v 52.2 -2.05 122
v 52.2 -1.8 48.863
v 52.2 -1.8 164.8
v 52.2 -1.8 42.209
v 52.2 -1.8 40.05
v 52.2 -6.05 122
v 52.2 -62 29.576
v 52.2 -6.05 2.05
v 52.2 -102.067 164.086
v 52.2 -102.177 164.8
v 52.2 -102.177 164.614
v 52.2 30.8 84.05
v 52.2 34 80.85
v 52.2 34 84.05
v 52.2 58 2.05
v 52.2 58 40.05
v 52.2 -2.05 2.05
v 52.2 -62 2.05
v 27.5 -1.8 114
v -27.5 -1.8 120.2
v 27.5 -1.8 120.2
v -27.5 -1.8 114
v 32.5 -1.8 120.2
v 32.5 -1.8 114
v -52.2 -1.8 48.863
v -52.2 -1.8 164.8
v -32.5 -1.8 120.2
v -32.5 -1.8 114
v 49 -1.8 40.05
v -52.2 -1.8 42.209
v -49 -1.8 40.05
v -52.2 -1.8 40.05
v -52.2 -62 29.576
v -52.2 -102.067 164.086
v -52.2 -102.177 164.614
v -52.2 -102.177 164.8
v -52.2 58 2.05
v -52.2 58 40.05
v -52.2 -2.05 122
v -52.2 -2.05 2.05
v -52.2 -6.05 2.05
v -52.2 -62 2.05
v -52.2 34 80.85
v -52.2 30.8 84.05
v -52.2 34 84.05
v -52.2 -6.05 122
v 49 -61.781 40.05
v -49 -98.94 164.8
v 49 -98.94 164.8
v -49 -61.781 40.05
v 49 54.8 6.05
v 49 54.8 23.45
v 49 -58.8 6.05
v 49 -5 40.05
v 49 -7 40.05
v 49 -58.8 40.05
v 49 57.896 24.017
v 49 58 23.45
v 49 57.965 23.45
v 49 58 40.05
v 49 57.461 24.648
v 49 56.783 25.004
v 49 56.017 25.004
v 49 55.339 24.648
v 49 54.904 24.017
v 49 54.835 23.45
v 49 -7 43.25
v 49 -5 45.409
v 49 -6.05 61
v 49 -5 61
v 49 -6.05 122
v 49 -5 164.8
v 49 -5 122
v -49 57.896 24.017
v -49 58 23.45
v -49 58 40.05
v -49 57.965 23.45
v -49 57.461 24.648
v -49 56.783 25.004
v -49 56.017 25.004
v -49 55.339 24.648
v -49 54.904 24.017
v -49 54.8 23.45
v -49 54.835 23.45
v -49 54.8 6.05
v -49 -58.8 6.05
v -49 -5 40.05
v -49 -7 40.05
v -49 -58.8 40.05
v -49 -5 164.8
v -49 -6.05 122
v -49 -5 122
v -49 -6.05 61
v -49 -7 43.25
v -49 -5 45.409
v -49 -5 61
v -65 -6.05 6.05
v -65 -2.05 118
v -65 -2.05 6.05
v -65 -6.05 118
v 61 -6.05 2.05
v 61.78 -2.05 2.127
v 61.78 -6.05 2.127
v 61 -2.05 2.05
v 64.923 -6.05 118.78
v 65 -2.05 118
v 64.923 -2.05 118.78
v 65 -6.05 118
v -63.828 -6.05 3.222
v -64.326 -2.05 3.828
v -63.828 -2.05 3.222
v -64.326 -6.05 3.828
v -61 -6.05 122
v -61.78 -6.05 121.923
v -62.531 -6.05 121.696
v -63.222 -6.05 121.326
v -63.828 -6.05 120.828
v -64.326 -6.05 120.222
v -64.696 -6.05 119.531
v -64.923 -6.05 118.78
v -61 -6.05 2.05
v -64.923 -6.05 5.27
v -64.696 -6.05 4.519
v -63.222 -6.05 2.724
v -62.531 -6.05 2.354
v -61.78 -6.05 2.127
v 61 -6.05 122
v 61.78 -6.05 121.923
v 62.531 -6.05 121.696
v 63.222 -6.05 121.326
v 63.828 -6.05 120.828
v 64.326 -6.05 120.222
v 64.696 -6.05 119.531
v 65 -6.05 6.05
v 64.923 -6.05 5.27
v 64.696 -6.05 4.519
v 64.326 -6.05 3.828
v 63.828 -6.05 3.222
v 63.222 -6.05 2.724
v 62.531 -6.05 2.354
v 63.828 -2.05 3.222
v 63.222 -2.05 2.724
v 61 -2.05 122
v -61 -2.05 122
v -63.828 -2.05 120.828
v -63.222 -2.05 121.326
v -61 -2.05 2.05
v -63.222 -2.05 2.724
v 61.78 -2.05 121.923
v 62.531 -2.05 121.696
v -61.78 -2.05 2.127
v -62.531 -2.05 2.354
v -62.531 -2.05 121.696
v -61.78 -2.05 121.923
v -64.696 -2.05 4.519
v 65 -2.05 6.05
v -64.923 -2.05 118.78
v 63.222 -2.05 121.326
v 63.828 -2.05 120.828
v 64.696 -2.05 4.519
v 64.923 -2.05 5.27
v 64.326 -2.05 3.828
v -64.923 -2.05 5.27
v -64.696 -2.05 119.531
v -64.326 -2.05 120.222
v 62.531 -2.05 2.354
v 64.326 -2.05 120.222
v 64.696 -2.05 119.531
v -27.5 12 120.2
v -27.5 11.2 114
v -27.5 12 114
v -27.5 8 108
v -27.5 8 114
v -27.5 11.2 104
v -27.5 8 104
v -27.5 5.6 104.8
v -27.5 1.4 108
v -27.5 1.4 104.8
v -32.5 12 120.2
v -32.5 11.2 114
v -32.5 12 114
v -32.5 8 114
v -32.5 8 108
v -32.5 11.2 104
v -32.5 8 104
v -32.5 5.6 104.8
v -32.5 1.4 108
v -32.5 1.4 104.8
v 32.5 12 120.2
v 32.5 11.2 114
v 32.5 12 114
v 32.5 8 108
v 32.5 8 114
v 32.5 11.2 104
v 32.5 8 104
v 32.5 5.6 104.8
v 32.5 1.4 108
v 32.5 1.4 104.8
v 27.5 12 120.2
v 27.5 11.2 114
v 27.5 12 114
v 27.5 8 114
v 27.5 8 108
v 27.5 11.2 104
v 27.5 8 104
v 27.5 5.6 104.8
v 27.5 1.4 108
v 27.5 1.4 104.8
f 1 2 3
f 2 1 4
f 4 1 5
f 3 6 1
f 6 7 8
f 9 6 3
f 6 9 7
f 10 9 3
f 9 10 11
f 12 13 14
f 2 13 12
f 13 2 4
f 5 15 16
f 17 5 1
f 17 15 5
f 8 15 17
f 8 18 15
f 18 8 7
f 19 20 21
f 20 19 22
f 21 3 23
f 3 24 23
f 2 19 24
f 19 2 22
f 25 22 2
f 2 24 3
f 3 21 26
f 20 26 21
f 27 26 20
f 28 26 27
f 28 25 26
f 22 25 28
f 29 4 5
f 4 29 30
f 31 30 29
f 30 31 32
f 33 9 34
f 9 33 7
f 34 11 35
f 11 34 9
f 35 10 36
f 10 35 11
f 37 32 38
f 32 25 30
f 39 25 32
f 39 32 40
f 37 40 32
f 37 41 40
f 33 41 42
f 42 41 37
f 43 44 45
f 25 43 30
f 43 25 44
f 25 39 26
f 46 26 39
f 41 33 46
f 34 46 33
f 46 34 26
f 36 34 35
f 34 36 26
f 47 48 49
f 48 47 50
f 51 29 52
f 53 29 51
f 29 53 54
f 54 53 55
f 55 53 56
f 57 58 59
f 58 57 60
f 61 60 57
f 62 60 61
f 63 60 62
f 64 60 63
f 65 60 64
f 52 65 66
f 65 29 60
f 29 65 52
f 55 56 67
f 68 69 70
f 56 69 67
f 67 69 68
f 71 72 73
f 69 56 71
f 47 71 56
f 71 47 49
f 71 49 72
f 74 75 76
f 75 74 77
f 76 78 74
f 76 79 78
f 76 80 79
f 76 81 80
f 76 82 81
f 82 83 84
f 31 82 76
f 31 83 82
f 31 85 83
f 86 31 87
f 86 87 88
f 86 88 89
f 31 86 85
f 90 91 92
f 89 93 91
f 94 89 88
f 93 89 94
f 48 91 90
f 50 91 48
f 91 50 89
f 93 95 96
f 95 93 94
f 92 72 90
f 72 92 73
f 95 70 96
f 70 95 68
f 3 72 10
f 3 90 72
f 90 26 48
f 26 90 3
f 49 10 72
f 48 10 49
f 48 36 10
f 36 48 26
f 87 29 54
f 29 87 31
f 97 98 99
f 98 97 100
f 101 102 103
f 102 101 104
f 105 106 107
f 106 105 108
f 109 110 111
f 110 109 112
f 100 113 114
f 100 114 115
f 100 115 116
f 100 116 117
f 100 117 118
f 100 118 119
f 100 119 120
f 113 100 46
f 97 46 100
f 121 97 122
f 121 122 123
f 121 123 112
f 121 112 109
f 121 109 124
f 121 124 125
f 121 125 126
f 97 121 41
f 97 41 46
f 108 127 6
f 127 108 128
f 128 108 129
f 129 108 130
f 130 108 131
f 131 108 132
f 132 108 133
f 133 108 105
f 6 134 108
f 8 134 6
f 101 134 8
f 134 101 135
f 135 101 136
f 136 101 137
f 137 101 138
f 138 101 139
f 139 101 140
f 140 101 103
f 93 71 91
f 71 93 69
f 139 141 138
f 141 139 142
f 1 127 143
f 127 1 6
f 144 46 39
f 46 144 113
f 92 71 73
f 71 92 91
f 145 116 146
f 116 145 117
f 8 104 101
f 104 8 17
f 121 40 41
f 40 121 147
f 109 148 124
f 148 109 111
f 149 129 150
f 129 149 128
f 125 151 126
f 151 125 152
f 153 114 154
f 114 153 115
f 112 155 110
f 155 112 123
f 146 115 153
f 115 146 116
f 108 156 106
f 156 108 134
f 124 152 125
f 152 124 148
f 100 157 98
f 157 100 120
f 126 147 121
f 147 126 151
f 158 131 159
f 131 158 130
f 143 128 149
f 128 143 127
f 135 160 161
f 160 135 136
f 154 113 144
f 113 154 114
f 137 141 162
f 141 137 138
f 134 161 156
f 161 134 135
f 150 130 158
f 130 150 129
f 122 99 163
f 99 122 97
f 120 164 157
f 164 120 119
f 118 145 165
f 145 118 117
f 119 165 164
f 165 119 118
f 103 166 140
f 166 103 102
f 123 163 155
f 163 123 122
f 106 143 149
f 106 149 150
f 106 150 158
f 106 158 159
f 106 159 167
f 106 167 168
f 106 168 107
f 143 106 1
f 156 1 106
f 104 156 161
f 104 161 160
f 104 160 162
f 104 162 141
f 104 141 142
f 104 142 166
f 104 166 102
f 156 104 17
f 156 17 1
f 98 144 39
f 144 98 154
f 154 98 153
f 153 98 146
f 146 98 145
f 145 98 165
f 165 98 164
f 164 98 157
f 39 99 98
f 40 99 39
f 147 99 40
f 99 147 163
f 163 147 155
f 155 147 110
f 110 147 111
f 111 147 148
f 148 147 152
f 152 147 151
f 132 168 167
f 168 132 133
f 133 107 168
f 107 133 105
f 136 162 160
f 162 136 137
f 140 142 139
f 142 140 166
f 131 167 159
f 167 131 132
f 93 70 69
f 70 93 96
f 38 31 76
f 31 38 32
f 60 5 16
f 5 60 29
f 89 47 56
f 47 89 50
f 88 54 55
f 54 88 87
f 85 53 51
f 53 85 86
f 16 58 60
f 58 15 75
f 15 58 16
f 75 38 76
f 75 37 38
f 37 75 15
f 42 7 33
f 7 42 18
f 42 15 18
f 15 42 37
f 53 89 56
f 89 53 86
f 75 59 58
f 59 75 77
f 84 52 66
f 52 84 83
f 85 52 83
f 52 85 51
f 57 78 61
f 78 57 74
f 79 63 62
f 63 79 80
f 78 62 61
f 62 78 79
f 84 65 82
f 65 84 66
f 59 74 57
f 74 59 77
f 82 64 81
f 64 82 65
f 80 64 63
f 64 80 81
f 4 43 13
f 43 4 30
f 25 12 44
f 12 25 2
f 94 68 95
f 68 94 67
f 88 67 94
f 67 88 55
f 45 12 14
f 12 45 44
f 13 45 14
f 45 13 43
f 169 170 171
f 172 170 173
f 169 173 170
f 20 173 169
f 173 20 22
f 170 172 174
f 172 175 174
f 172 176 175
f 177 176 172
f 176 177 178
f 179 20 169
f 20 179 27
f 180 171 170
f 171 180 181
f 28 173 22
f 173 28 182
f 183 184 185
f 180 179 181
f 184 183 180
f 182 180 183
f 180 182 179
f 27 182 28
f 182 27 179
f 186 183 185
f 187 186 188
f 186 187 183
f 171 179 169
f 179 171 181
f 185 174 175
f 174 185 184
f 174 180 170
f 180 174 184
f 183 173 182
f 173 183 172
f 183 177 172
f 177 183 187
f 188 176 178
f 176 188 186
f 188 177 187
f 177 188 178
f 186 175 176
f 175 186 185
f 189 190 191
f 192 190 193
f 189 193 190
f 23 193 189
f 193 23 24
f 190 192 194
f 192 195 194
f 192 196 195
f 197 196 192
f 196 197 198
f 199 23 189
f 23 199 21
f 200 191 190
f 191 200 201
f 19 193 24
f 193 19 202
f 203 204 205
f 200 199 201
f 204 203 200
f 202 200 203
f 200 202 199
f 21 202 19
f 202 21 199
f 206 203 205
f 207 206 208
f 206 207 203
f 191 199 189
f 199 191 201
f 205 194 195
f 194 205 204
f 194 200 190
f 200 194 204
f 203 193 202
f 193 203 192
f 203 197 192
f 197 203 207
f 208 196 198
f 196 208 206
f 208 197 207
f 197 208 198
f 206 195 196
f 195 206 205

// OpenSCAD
part = "candidate_a";

$fa = 5;
$fs = 0.8;

door_width = 110;
door_height = 110;
bar_spacing = 12;
bar_diameter = 3.5;
wall = 3.2;
door_tolerance = 3;
tray_base = bar_diameter/2 + 0.3;

inner_width = door_width - 12;
plate_width = door_width + 20;
plate_bottom = tray_base;
plate_top = door_height + 12;
plate_thickness = max(wall, 4);
tray_back = -62;
tray_front = 58;
tray_floor = 4;
tray_wall_height = 34;
tray_lip_height = 19;
hood_front = 34;
hook_center = bar_spacing * 2.5;
hook_width = min(5, bar_spacing - bar_diameter - 1.5);
hook_depth = bar_diameter + 2.5;
hook_throat = bar_diameter - 0.3;
outlet_top = tray_base + tray_floor + tray_wall_height;

cavity = [[-57,24],[-5,24],[-5,165],[-99,165]];

function side_x(s) = s > 0 ? inner_width/2 : -inner_width/2-wall;

module yz_extrude(width) {
    translate([-width/2,0,0]) rotate([90,0,90]) linear_extrude(width) children();
}

module rounded_xz(width,height,r) {
    offset(r=r) square([width-2*r,height-2*r],center=true);
}

module reservoir_shell() {
    difference() {
        yz_extrude(inner_width + 2*wall) offset(r=wall) polygon(cavity);
        yz_extrude(inner_width) polygon(cavity);
        translate([-inner_width/2-2*wall,-110,164.8]) cube([inner_width+4*wall,120,20]);
        translate([-inner_width/2-0.1,-61,18]) cube([inner_width+0.2,61,outlet_top-18]);
    }
}

module faceplate() {
    difference() {
        translate([0,-bar_diameter/2-0.3-plate_thickness/2,(plate_bottom+plate_top)/2])
            rotate([90,0,0]) linear_extrude(plate_thickness,center=true)
                rounded_xz(plate_width,plate_top-plate_bottom,4);
        translate([0,-bar_diameter/2-0.3-plate_thickness/2,30]) cube([inner_width,plate_thickness+2,62],center=true);
    }
}

module trough() {
    translate([-inner_width/2-wall,tray_back,0]) cube([inner_width+2*wall,tray_front-tray_back,tray_floor]);
    for (s=[-1,1]) translate([side_x(s),tray_back,tray_floor])
        cube([wall,tray_front-tray_back,tray_wall_height]);
    translate([-inner_width/2-wall,tray_back,tray_floor])
        cube([inner_width+2*wall,wall,tray_wall_height]);
    translate([-inner_width/2-wall,tray_front-wall,tray_floor])
        cube([inner_width+2*wall,wall,tray_lip_height-wall/2]);
    translate([-inner_width/2-wall,tray_front-wall/2,tray_floor+tray_lip_height-wall/2])
        rotate([0,90,0]) cylinder(d=wall,h=inner_width+2*wall);
    for (s=[-1,1]) translate([s*(inner_width/2+wall/2),tray_front-13,tray_floor+tray_lip_height])
        rotate([90,0,0]) cylinder(d=wall,h=tray_front-tray_back-13);
}

module hood() {
    hood_low = tray_floor + tray_wall_height;
    hood_high = hood_low + hood_front + 10;
    hull() {
        translate([-inner_width/2-wall,-7,hood_low]) cube([inner_width+2*wall,wall,wall]);
        translate([-inner_width/2-wall,hood_front-wall,hood_high-wall]) cube([inner_width+2*wall,wall,wall]);
    }
    for (s=[-1,1]) hull() {
        translate([side_x(s),-7,hood_low]) cube([wall,wall,wall]);
        translate([side_x(s),hood_front-wall,hood_high-wall]) cube([wall,wall,wall]);
    }
    translate([-inner_width/2-wall,hood_front-wall/2,hood_high-wall/2])
        rotate([0,90,0]) cylinder(d=wall,h=inner_width+2*wall);
}

module top_hooks() {
    for (s=[-1,1]) translate([s*hook_center-hook_width/2,0,0]) union() {
        translate([0,-2,door_height+4]) cube([hook_width,hook_depth+8,wall+3]);
        translate([0,hook_depth+2,door_height-6]) cube([hook_width,wall,13]);
        translate([0,-1.8+hook_throat,door_height-5.2])
            cube([hook_width,hook_depth+wall+2.4-hook_throat,wall]);
        hull() {
            translate([0,hook_depth+2,door_height-6]) cube([hook_width,wall,3]);
            translate([0,hook_depth-1,door_height-5]) cube([hook_width,wall,3]);
        }
    }
}

module reinforcements() {
    for (s=[-1,1]) hull() {
        translate([side_x(s),-56,0]) cube([wall,18,wall]);
        translate([side_x(s),-56,0]) cube([wall,wall,24]);
    }
}

module candidate_a() {
    union() {
        reservoir_shell();
        faceplate();
        translate([0,0,tray_base]) trough();
        translate([0,0,tray_base]) hood();
        top_hooks();
        translate([0,0,tray_base]) reinforcements();
    }
}

module capacity() {
    intersection() {
        yz_extrude(inner_width) polygon(cavity);
        translate([-inner_width/2,-110,-20]) cube([inner_width,120,184.8]);
    }
}

module outlet_probe() {
    intersection() {
        capacity();
        translate([-inner_width/2,-110,24]) cube([inner_width,120,0.5]);
    }
}

module inlet_probe() {
    intersection() {
        capacity();
        translate([-inner_width/2,-110,164.3]) cube([inner_width,120,0.5]);
    }
}

module outlet_clear_probe() {
    intersection() {
        capacity();
        translate([-inner_width/2+1,-56,24.1]) cube([inner_width-2,50,0.3]);
    }
}

module inlet_clear_probe() {
    intersection() {
        capacity();
        translate([-inner_width/2+1,-97,164.4]) cube([inner_width-2,90,0.3]);
    }
}

module cage() {
    for (x=[-120:bar_spacing:120]) difference() {
        translate([x,0,-20]) cylinder(d=bar_diameter,h=160);
        translate([-door_width/2,-10,0]) cube([door_width,20,door_height]);
    }
    for (z=[0,door_height]) translate([-120,0,z]) rotate([0,90,0]) cylinder(d=bar_diameter,h=240);
}

module hook_install_sweep() {
    hull() {
        translate([-door_width/2,16,door_height-8.5]) rotate([0,90,0])
            cylinder(d=bar_diameter,h=door_width);
        translate([-door_width/2,0,door_height-8.5]) rotate([0,90,0])
            cylinder(d=bar_diameter,h=door_width);
    }
    hull() {
        translate([-door_width/2,0,door_height-8.5]) rotate([0,90,0])
            cylinder(d=bar_diameter,h=door_width);
        translate([-door_width/2,0,door_height]) rotate([0,90,0])
            cylinder(d=bar_diameter,h=door_width);
    }
}

module section() {
    intersection() {
        candidate_a();
        translate([-0.8,-130,-20]) cube([1.6,240,220]);
    }
}

if (part == "capacity") capacity();
else if (part == "outlet_probe") outlet_probe();
else if (part == "inlet_probe") inlet_probe();
else if (part == "outlet_blockage") intersection() { candidate_a(); outlet_clear_probe(); }
else if (part == "inlet_blockage") intersection() { candidate_a(); inlet_clear_probe(); }
else if (part == "cage") cage();
else if (part == "static_interference") intersection() { candidate_a(); cage(); }
else if (part == "hook_snap_interference") intersection() { candidate_a(); hook_install_sweep(); }
else if (part == "pull_interference") intersection() { translate([0,-7,0]) candidate_a(); cage(); }
else if (part == "lift_interference") intersection() { translate([0,0,5]) candidate_a(); cage(); }
else if (part == "door_section") intersection() { candidate_a(); translate([-100,-1.7,0.1]) cube([200,3.4,door_height-0.2]); }
else if (part == "section") section();
else candidate_a();
